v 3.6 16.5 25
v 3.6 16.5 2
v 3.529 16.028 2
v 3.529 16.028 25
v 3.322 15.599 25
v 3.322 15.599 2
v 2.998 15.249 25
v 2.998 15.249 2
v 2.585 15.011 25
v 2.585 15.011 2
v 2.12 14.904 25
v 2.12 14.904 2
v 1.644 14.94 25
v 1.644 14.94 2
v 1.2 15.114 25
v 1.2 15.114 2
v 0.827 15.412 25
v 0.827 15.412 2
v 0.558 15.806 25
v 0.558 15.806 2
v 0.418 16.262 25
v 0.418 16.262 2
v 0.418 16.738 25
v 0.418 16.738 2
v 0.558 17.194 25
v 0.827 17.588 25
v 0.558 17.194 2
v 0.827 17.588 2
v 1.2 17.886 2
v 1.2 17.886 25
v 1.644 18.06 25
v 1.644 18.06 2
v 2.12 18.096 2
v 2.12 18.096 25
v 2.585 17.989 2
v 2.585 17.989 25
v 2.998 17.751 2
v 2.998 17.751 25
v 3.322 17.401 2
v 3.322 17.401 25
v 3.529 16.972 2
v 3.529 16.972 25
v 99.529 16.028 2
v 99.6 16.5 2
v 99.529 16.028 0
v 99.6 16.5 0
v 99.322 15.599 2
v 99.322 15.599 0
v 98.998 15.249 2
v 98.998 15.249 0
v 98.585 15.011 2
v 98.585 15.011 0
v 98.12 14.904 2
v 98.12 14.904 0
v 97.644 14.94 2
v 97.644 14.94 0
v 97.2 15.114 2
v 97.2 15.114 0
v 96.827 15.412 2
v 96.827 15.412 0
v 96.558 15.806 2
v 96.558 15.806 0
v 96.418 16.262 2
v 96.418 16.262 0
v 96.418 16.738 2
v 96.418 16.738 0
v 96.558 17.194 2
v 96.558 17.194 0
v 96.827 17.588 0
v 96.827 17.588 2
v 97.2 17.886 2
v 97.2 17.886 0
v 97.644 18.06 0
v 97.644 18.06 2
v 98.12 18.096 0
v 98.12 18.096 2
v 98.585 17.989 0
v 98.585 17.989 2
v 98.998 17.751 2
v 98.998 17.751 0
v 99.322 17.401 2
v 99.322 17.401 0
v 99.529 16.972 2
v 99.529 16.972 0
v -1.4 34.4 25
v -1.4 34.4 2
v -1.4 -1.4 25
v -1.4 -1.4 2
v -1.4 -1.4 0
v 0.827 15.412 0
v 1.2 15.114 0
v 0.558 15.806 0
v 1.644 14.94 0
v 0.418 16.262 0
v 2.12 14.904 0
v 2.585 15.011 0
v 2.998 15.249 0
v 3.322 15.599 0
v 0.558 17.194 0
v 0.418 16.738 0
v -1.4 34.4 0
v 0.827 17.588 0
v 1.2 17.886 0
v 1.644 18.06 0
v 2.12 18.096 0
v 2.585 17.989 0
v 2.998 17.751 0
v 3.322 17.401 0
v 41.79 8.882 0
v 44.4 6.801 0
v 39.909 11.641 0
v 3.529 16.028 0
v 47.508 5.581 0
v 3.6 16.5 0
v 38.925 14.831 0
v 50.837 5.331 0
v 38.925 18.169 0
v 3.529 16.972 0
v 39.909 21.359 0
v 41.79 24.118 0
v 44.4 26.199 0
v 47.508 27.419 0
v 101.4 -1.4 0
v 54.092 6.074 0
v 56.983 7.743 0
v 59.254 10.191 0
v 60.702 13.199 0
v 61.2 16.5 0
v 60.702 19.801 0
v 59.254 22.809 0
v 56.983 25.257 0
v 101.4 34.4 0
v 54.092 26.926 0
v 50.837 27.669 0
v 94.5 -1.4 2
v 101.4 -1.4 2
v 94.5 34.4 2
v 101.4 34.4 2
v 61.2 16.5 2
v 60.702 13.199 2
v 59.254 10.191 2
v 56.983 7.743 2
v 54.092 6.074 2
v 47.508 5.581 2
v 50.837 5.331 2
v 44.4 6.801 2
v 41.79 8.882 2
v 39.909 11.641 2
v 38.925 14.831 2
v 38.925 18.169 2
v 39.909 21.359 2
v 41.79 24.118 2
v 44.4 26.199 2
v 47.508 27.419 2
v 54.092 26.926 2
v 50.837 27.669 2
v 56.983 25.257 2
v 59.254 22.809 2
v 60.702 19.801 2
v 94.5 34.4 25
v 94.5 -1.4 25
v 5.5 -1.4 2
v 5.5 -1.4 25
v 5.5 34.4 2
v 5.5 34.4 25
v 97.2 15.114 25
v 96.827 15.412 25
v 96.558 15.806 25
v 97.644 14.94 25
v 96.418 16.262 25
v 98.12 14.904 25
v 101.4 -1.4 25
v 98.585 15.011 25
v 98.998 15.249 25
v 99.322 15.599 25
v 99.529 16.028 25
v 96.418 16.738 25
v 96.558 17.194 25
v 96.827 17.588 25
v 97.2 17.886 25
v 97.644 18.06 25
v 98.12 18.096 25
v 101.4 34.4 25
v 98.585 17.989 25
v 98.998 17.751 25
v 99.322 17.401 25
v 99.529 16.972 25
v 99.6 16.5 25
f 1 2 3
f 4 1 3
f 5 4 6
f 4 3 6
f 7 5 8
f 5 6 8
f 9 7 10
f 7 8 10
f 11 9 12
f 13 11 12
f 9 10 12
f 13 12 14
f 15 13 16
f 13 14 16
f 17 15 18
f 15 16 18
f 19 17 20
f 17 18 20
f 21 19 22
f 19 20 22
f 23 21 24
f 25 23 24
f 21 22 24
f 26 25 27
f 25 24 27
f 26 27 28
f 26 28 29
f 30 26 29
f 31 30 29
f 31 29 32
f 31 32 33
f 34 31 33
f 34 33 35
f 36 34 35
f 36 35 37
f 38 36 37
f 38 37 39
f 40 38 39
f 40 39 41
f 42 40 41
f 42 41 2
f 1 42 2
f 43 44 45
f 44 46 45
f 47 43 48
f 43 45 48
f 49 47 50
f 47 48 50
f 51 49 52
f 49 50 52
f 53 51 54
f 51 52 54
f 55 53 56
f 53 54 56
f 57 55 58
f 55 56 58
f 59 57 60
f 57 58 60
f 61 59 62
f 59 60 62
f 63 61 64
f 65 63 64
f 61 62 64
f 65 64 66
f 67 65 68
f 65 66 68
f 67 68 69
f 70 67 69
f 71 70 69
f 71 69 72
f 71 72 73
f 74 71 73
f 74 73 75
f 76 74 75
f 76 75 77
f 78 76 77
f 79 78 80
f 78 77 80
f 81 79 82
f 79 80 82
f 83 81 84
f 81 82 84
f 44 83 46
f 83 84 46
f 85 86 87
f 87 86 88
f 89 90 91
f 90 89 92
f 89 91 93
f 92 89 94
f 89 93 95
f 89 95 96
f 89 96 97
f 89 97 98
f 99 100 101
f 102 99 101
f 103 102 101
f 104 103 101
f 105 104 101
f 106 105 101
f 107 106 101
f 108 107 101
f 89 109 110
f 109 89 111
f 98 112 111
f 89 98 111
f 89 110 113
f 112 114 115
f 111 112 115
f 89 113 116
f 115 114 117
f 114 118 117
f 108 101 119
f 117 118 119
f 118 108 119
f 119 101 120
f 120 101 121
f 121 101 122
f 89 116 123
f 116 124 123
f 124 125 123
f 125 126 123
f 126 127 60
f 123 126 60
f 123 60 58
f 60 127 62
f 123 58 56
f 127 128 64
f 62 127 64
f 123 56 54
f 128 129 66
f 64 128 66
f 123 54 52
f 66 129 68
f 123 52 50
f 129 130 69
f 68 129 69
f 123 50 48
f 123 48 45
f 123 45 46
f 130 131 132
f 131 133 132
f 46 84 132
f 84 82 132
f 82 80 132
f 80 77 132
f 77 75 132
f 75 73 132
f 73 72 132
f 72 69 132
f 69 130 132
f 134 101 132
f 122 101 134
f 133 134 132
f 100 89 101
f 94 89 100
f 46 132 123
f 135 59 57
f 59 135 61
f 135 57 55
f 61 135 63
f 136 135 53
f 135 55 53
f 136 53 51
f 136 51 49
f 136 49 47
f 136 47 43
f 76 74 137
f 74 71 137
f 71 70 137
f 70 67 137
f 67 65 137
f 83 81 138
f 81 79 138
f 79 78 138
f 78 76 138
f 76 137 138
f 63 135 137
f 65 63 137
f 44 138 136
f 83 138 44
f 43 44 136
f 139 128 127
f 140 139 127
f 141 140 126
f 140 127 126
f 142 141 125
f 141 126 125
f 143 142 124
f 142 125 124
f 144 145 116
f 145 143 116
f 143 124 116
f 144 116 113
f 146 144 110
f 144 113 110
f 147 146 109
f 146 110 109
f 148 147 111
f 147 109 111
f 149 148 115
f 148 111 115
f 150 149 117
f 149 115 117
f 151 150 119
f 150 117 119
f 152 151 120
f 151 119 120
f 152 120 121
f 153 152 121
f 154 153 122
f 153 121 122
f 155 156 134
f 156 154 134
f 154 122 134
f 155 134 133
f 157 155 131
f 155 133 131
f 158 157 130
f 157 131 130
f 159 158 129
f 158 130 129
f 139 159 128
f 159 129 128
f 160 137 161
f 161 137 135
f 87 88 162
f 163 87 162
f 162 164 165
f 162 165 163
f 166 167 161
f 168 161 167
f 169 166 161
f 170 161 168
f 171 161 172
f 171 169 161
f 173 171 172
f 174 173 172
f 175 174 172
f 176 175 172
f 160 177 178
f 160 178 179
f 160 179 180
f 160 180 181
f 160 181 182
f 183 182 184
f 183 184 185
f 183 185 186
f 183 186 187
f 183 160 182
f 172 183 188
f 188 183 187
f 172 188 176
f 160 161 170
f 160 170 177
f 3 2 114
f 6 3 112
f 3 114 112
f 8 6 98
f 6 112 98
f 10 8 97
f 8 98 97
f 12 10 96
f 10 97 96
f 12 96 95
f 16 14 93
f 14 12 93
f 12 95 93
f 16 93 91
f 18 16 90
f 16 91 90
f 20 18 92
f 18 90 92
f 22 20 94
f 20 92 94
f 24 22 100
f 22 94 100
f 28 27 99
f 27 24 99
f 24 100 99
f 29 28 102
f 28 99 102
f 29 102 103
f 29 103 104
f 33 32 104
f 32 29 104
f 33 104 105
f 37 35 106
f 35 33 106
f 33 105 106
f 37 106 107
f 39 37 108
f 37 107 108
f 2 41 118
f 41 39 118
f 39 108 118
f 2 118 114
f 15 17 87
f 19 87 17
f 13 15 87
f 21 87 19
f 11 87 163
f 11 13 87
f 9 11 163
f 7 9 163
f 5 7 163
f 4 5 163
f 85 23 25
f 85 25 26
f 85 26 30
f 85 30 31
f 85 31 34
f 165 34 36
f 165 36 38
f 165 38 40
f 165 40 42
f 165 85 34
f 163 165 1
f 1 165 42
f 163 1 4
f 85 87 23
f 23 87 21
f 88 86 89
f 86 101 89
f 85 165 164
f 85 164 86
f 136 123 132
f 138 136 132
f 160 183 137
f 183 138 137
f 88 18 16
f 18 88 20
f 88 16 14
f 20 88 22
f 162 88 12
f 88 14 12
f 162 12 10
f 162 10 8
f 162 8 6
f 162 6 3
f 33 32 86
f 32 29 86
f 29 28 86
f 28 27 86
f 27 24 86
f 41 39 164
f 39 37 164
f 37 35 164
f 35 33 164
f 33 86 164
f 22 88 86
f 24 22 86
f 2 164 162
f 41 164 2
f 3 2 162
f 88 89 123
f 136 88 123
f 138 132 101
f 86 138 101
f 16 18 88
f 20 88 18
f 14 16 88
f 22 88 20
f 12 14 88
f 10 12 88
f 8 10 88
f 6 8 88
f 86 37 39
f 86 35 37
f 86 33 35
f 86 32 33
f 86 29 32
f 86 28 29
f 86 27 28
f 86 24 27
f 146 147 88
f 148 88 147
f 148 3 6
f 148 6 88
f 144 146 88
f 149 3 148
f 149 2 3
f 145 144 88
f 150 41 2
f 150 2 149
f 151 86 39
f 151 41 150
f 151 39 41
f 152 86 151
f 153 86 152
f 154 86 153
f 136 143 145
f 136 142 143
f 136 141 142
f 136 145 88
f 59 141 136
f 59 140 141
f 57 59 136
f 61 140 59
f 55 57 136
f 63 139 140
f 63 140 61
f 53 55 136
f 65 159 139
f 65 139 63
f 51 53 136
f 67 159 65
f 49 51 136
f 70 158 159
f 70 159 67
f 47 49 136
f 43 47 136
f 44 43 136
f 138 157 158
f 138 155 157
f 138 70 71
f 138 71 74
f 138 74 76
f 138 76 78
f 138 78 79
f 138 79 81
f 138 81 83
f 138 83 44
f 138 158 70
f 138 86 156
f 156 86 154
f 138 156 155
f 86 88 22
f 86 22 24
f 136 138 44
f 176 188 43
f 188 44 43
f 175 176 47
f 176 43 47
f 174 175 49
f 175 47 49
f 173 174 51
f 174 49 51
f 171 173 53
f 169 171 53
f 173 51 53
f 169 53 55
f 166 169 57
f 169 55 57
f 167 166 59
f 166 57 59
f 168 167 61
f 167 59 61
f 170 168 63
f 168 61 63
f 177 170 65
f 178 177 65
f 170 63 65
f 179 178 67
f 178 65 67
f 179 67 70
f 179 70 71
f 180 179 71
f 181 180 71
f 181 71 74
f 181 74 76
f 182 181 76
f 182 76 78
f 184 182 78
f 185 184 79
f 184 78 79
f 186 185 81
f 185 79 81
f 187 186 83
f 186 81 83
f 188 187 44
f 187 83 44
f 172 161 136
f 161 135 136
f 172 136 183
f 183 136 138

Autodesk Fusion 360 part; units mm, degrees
sketch "Sketch1" plane through (0, 0, 0) normal (0, 0, 1) x (1, 0, 0)
  line L0 (0, 0) -> (100, 0)
  line L1 (100, 0) -> (100, 33)
  line L2 (100, 33) -> (0, 33)
  line L3 (0, 33) -> (0, 0)
  line L4 (0, 0) -> (2, 0) construction
  line L5 (2, 0) -> (2, 2) construction
  line L6 (2, 2) -> (0, 2) construction
  line L7 (0, 2) -> (0, 0) construction
  line L8 (0, 33) -> (2, 33) construction
  line L9 (2, 33) -> (2, 31) construction
  line L10 (2, 31) -> (0, 31) construction
  line L11 (0, 31) -> (0, 33) construction
  line L12 (100, 33) -> (98, 33) construction
  line L13 (98, 33) -> (98, 31) construction
  line L14 (98, 31) -> (100, 31) construction
  line L15 (100, 31) -> (100, 33) construction
  line L16 (100, 0) -> (98, 0) construction
  line L17 (98, 0) -> (98, 2) construction
  line L18 (98, 2) -> (100, 2) construction
  line L19 (100, 2) -> (100, 0) construction
  line L20 (98, 31) -> (98, 2)
  line L21 (98, 2) -> (2, 2)
  line L22 (2, 2) -> (2, 31)
  line L23 (98, 31) -> (2, 31)
  line L24 (2, 16.5) -> (98, 16.5) construction
  line L25 (50, 2) -> (50, 31) construction
  circle A0 centre (50, 16.5) radius 11.2
  line L26 (101.5, -1.5) -> (-1.5, -1.5) construction
  line L27 (-1.5, -1.5) -> (-1.5, 34.5) construction
  line L28 (-1.5, 34.5) -> (101.5, 34.5) construction
  line L29 (101.5, 34.5) -> (101.5, -1.5) construction
  line L30 (5.5, 33) -> (5.5, 0)
  line L31 (94.5, 33) -> (94.5, 0)
  circle A1 centre (2, 16.5) radius 1.6
  circle A2 centre (98, 16.5) radius 1.6
  line L32 (101.4, 34.4) -> (-1.4, 34.4)
  line L33 (-1.4, 34.4) -> (-1.4, -1.4)
  line L34 (-1.4, -1.4) -> (101.4, -1.4)
  line L35 (101.4, -1.4) -> (101.4, 34.4)
  line L36 (101.4, 34.4) -> (-1.4, -1.4) construction
  line L37 (-1.4, 34.4) -> (101.4, -1.4) construction
  line L38 (94.5, 33) -> (94.5, 34.4)
  line L39 (94.5, 0) -> (94.5, -1.4)
  line L40 (5.5, 0) -> (5.5, -1.4)
  line L41 (5.5, 33) -> (5.5, 34.4)
  point P0 (50, 16.5)
  point P1 (50, 16.5)
  dimension "d1" = 100
  dimension "d2" = 33
  dimension "d17" = 96
  dimension "d22" = 29
  dimension "d23" = 22.4
  dimension "d24" = 103
  dimension "d25" = 36
  dimension "d26" = 7
  dimension "d27" = 7
  dimension "d31" = 3.2
  dimension "d32" = 3.2
  dimension "d40" = 102.8
  dimension "d41" = 35.8
extrude "Extrude5" add sketch "Sketch1" along normal blind 2 contours L0 L2 L3 L21 L22 L23 L30 A1 | L0 L2 L3 L32 L33 L34 L40 L41 | L0 L21 L30 L31 | L0 L34 L39 L40 | L0 L1 L2 L20 L21 L23 L31 A2 | L0 L1 L2 L32 L34 L35 L38 L39 | L21 L23 L30 L31 | L21 L22 L23 L30 A1 | L2 L32 L38 L41 | L2 L23 L30 L31 | L20 L21 L23 L31 A2 makes body 1
extrude "Extrude6" add sketch "Sketch1" along normal blind 23 from surface at 2 separate body contours L0 L2 L3 L21 L22 L23 L30 A1 | L0 L2 L3 L32 L33 L34 L40 L41 | L0 L1 L2 L20 L21 L23 L31 A2 | L0 L1 L2 L32 L34 L35 L38 L39 | L21 L22 L23 L30 A1 | L20 L21 L23 L31 A2 makes body 2 at (-1.4, 22.4667, 9.6667) makes body 3 at (101.4, 10.5333, 9.6667)
